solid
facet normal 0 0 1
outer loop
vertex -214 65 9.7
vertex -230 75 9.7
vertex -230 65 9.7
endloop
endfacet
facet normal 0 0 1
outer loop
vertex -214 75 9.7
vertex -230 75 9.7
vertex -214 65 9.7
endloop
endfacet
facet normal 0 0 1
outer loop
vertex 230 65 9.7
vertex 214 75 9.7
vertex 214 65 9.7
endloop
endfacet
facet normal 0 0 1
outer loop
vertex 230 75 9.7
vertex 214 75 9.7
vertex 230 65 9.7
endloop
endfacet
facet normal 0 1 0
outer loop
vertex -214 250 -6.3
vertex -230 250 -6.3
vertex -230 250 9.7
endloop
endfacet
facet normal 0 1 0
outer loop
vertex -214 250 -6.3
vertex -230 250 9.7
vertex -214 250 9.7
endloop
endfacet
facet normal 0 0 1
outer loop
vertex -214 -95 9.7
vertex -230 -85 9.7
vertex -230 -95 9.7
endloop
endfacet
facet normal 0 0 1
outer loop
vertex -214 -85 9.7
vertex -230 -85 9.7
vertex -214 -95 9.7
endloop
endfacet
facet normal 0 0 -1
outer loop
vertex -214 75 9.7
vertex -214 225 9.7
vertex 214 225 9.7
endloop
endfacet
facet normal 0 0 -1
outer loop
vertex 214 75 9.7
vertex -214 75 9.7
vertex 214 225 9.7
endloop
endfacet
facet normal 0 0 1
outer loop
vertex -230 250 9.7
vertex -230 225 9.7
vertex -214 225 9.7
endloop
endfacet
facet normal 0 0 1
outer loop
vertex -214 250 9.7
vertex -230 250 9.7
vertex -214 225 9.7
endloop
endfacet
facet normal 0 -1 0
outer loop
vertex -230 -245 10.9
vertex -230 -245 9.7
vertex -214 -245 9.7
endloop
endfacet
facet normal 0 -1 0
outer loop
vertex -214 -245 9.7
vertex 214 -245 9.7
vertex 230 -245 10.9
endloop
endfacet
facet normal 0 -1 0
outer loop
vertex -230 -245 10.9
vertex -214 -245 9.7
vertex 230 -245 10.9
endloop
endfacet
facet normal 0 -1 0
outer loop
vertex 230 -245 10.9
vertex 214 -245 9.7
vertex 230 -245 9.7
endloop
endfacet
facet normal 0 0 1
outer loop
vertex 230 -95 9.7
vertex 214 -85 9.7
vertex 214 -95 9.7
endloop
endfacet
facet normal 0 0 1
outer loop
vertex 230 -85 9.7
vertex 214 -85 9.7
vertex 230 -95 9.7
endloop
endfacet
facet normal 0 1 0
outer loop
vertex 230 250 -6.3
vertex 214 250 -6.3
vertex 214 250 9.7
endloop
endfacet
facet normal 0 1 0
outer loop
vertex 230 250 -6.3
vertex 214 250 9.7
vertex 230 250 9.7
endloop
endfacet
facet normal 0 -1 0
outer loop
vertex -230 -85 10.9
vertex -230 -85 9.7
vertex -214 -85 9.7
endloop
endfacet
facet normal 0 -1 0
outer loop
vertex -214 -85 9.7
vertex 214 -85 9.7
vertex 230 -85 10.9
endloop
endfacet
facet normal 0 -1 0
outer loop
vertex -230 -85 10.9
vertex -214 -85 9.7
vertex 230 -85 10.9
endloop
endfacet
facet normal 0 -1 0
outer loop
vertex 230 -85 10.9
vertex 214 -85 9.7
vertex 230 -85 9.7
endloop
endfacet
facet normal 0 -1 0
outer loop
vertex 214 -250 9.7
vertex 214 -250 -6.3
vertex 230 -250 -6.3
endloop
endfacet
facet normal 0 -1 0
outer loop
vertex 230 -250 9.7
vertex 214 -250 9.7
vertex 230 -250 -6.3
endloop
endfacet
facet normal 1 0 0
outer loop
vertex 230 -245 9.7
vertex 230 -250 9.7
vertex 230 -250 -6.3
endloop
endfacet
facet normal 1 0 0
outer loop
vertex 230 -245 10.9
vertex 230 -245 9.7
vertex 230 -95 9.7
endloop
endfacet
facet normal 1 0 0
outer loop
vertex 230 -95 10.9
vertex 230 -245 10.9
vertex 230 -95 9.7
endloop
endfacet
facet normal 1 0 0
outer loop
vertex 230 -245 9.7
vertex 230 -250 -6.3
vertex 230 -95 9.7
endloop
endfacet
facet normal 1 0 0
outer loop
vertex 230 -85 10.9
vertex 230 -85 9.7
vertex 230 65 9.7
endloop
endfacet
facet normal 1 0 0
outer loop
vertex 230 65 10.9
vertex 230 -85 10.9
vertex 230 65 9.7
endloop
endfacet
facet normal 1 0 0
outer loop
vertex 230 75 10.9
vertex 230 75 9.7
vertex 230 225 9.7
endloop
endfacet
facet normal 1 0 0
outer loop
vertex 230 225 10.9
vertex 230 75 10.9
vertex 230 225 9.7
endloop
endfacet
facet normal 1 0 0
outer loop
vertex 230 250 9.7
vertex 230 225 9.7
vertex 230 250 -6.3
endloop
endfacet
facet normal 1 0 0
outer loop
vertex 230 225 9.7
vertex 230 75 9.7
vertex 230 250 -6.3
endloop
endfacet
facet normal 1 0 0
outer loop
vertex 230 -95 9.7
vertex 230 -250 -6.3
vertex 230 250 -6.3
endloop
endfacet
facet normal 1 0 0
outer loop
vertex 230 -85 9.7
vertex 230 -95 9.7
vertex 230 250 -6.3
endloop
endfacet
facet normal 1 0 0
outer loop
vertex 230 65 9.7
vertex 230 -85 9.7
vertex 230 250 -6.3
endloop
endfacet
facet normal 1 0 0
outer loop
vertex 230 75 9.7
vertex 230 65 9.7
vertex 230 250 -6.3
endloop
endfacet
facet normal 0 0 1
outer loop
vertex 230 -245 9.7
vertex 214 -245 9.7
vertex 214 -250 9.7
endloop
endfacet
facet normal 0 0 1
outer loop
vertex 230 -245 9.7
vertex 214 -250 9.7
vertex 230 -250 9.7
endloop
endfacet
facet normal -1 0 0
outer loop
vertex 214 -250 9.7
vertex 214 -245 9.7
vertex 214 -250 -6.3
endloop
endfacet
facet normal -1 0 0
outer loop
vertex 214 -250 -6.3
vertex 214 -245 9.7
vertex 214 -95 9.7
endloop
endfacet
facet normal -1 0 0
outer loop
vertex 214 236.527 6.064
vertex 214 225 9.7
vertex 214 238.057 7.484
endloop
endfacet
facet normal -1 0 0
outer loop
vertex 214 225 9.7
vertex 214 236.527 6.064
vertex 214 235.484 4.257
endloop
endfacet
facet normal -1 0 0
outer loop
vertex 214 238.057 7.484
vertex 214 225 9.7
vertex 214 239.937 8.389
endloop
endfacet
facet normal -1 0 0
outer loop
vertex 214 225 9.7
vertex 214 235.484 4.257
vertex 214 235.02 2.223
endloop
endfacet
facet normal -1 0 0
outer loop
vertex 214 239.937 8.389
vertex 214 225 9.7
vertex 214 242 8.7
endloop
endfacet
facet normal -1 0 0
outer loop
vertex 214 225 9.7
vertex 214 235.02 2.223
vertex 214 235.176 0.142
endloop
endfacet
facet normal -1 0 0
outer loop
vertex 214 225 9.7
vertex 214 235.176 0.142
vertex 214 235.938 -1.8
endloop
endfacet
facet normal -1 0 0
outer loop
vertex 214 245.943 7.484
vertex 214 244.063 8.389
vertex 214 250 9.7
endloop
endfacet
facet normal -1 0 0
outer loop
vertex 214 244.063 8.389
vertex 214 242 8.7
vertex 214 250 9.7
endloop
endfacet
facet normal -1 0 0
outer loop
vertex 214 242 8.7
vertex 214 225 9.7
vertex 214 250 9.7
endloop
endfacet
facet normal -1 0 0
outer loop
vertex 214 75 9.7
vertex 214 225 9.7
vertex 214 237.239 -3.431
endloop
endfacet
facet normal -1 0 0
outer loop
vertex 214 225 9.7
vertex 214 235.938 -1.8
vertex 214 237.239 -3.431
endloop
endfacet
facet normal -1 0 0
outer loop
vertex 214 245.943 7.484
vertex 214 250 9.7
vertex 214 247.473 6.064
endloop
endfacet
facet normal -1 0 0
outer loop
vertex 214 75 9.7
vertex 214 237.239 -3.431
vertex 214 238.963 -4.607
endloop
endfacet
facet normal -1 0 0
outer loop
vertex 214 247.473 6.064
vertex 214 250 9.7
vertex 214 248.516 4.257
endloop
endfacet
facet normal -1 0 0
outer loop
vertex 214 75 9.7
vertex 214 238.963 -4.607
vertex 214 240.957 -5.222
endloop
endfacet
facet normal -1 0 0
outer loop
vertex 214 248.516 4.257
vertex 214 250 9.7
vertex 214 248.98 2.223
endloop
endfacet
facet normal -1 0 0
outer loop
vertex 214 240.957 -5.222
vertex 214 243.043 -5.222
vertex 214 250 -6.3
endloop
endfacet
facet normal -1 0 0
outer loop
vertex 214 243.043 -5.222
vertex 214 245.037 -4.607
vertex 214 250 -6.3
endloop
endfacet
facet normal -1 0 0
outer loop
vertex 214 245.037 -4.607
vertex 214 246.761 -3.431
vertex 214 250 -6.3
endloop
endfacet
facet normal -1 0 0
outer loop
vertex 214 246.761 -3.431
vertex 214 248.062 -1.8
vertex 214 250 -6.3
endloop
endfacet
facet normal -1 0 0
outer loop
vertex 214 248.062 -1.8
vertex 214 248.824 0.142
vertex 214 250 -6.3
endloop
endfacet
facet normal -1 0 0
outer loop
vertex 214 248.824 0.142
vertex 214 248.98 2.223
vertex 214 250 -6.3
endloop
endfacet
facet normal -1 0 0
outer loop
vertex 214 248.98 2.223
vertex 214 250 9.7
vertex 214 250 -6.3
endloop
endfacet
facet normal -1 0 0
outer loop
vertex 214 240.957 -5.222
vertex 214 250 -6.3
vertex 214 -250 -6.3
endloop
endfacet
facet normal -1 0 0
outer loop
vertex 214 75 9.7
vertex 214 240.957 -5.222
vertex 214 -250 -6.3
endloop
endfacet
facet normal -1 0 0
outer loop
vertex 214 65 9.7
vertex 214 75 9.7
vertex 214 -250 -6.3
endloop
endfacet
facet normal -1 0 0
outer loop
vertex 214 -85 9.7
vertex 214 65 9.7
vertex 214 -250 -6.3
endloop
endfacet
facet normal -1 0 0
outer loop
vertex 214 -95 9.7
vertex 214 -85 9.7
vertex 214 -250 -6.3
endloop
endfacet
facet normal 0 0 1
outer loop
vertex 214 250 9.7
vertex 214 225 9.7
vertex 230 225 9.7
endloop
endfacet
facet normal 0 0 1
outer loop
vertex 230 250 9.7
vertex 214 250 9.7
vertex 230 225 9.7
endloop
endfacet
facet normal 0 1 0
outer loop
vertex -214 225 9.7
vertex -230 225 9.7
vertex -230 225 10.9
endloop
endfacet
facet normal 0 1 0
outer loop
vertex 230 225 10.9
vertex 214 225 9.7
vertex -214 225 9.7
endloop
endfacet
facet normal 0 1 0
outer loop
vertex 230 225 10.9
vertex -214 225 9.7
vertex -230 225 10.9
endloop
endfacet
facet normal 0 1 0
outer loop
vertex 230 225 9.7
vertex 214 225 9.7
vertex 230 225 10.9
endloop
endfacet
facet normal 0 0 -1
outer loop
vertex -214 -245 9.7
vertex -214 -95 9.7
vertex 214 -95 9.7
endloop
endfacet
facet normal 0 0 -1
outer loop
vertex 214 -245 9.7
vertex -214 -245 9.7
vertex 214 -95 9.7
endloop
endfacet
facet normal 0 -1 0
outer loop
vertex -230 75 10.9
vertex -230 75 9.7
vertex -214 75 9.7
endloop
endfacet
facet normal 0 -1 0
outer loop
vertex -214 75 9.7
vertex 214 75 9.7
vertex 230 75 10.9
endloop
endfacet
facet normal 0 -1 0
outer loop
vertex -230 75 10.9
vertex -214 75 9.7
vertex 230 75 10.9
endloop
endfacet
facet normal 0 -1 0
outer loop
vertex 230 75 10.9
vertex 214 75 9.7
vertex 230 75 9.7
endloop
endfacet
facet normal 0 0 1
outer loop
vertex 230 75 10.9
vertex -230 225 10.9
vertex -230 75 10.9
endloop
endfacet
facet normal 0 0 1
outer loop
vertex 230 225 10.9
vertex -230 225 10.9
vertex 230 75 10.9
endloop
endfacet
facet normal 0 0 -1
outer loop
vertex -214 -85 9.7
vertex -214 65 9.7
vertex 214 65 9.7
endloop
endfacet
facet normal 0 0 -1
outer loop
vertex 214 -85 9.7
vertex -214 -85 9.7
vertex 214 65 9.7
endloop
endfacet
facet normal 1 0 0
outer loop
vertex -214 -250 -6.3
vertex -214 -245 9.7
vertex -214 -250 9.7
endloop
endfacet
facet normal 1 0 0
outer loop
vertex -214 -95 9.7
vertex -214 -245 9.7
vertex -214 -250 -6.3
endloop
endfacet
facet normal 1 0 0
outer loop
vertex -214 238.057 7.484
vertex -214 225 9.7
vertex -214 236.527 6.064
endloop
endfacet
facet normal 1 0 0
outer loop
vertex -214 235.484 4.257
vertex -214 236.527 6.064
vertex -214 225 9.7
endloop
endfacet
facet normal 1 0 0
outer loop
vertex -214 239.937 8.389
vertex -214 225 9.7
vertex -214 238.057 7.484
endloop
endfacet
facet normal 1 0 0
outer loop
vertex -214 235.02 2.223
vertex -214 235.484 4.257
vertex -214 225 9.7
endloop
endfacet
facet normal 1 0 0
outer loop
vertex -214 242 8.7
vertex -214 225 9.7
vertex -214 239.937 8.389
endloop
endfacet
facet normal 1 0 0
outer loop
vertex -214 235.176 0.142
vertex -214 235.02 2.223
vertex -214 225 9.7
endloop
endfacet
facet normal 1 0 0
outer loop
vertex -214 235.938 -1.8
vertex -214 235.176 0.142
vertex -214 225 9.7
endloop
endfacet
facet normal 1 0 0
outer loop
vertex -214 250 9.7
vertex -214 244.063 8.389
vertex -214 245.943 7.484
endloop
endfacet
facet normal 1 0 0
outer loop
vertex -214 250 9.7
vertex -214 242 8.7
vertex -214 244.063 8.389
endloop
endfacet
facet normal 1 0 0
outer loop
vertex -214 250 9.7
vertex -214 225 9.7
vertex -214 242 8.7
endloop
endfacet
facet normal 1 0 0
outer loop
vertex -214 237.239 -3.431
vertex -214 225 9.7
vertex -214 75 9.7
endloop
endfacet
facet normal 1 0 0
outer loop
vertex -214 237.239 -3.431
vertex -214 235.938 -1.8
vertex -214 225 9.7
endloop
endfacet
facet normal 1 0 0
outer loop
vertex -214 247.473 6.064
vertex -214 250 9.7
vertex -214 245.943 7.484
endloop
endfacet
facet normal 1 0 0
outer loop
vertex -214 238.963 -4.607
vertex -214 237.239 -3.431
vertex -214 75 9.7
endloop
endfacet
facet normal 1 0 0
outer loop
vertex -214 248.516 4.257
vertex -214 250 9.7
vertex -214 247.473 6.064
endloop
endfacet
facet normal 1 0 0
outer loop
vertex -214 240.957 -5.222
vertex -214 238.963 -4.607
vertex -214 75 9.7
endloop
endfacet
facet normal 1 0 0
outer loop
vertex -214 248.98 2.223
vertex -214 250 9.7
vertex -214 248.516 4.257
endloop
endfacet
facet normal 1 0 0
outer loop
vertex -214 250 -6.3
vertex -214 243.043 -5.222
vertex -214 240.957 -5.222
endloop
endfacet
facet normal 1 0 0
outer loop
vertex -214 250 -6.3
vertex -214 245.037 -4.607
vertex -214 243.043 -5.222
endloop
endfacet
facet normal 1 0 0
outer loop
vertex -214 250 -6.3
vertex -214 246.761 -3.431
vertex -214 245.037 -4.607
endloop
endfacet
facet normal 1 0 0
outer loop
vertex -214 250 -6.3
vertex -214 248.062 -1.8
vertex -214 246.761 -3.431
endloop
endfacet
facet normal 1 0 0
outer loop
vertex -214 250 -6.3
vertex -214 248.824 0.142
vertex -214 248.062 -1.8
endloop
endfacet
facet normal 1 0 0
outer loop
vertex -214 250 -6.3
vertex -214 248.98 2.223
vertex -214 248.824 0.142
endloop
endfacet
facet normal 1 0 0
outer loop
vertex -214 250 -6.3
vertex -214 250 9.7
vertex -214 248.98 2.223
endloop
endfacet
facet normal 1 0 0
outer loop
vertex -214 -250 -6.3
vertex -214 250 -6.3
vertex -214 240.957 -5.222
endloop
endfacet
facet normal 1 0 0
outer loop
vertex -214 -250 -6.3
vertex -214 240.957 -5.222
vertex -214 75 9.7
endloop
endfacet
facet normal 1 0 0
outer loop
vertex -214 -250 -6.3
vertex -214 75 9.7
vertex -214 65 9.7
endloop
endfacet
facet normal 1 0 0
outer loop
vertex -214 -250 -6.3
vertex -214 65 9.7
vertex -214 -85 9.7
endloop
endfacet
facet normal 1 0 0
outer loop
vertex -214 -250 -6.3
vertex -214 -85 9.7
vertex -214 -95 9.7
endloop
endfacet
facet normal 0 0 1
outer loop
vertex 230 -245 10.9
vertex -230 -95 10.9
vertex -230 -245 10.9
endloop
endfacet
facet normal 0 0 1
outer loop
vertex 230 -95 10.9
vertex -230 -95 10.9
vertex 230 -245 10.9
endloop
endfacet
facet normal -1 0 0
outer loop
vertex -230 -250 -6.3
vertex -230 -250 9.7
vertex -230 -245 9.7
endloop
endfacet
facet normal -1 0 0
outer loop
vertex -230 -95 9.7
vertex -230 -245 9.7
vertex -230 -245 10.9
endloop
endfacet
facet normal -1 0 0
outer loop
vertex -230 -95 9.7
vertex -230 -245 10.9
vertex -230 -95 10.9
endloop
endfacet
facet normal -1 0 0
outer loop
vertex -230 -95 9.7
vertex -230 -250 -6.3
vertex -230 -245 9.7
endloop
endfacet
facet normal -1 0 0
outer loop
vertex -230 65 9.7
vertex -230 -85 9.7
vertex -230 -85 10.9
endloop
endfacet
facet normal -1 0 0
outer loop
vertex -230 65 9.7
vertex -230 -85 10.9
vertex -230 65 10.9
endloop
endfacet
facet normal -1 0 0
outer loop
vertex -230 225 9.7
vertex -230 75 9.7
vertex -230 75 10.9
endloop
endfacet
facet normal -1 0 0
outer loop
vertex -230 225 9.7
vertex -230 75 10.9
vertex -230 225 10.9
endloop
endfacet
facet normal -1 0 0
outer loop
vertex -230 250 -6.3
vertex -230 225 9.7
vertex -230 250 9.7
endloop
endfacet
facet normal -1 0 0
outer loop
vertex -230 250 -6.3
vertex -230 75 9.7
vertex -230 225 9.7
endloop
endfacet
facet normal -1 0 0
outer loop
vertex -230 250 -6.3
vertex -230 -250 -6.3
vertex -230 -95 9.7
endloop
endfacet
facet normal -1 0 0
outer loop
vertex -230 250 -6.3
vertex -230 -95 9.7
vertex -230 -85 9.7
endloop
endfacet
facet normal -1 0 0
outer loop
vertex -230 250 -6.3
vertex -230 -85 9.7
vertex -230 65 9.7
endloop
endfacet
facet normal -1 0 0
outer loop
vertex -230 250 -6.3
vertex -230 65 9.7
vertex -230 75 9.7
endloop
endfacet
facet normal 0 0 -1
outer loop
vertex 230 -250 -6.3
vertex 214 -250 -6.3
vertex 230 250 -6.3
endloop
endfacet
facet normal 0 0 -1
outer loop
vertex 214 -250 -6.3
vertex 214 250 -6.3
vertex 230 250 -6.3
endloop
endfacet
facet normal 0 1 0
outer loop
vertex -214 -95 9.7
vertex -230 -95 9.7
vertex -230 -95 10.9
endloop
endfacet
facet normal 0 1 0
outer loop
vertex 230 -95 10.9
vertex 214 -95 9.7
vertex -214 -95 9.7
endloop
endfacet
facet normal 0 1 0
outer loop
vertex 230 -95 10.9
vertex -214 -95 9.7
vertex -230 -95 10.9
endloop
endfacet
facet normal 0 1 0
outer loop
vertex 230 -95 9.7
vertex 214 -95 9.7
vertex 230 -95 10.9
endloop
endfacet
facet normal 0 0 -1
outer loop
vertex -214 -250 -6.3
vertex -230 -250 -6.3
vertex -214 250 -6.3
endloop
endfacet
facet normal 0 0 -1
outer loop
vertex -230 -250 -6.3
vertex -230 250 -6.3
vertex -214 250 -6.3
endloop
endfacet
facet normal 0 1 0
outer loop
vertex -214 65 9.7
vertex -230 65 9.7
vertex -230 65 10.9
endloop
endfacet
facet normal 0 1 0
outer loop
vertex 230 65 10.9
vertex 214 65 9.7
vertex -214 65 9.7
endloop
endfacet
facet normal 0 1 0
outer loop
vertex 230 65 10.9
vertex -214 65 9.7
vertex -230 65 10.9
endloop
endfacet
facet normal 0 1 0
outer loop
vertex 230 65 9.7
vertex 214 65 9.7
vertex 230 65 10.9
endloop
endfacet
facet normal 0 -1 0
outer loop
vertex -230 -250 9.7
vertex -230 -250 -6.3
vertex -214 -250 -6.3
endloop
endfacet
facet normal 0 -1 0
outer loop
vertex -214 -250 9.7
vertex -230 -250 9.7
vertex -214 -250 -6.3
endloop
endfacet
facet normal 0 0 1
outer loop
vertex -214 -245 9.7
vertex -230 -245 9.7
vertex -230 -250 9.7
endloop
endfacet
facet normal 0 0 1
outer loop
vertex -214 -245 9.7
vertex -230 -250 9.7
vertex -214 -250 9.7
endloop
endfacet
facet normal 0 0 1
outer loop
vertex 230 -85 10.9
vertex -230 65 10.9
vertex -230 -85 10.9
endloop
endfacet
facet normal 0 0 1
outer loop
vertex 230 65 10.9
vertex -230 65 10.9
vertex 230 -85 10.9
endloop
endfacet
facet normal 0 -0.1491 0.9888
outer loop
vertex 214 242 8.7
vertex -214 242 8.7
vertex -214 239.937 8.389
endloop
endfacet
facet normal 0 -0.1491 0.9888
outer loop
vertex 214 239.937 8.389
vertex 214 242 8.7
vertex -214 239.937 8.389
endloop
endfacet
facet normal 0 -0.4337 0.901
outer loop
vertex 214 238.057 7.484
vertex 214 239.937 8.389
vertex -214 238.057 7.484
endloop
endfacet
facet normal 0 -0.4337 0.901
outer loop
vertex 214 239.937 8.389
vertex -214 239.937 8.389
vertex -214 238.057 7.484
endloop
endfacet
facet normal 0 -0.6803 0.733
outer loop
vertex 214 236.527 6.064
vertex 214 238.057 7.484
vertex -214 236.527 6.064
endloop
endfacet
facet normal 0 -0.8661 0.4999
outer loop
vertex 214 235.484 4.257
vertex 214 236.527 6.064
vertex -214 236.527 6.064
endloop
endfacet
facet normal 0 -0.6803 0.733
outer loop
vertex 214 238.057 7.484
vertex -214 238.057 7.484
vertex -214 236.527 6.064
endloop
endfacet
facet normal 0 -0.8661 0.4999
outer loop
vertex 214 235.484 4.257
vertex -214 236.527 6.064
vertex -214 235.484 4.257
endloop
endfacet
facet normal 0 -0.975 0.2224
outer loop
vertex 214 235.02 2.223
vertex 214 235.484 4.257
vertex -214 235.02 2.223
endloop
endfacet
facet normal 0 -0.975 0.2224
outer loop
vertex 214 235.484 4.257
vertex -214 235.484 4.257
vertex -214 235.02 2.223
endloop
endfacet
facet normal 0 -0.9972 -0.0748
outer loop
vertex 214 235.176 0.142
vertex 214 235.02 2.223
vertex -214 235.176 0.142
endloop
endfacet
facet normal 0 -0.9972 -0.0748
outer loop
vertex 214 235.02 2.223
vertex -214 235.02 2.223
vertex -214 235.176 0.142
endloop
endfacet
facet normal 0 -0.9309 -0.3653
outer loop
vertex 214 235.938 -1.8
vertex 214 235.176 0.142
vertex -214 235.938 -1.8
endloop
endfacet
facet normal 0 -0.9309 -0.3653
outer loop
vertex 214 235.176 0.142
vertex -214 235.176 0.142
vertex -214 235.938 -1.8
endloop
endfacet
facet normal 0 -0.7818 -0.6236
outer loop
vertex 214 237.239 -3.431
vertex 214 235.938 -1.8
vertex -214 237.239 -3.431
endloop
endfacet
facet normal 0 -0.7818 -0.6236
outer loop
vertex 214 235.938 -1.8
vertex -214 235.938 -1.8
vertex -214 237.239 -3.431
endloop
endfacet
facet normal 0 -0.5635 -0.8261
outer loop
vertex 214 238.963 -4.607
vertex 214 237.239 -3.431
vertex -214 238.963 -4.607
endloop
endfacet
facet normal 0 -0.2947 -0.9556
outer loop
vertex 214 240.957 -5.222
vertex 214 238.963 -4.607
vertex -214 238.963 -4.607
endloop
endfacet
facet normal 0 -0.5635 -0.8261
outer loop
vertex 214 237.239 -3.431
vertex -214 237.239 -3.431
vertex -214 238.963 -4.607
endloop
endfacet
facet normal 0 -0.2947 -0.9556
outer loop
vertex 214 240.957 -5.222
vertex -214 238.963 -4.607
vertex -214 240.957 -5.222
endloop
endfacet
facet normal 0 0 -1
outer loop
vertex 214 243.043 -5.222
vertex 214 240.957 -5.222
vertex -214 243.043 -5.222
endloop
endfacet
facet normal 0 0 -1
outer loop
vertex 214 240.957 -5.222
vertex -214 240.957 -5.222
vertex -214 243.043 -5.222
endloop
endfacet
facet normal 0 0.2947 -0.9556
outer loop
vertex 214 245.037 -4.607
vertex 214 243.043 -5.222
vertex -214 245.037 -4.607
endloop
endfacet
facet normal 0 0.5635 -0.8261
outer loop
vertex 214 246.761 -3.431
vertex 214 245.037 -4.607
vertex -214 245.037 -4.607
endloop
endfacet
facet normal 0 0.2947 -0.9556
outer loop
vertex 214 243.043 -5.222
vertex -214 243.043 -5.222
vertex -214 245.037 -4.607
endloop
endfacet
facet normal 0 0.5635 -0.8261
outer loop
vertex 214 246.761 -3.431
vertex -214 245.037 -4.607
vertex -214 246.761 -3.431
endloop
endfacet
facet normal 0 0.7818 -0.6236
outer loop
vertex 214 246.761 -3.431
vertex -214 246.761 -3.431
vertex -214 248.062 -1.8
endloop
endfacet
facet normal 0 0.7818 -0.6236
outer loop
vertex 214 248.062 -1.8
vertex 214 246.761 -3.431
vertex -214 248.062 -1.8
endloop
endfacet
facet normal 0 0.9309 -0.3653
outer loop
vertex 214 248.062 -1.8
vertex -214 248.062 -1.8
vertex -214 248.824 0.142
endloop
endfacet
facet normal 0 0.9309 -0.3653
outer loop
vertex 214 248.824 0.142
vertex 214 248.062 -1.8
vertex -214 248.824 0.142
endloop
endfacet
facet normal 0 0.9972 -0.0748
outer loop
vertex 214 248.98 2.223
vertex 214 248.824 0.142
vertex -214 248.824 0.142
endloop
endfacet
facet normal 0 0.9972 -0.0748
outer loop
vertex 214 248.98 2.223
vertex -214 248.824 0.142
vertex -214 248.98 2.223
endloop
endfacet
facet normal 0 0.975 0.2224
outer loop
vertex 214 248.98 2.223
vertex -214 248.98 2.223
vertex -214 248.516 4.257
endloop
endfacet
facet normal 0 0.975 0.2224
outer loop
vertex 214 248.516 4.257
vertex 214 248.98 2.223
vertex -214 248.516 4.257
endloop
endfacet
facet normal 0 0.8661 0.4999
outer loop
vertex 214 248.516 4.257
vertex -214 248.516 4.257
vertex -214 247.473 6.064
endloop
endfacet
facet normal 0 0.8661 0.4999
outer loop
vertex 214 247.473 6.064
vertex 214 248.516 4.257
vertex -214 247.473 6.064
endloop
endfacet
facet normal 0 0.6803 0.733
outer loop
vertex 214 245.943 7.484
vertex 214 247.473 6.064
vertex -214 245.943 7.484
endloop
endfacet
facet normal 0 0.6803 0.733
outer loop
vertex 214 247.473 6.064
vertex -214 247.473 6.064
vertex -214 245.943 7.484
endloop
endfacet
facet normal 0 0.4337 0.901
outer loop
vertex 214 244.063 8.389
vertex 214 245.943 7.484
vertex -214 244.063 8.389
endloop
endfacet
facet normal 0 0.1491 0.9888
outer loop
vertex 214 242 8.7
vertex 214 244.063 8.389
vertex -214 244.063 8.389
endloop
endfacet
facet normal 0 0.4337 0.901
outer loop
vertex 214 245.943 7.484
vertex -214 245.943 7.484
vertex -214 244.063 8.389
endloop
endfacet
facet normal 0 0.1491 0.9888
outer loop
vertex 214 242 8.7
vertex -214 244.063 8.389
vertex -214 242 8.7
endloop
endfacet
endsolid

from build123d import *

# Parameters (mm, degrees)
SKETCH1_W             = 16
SKETCH1_H             = 16
BOSS_EXTRUDE1_DEPTH   = 250
BOSS_EXTRUDE1_2_DEPTH = 250
SKETCH2_W             = 460
SKETCH2_H             = 150
BOSS_EXTRUDE2_DEPTH   = 1.2
SKETCH3_R             = 7
BOSS_EXTRUDE3_DEPTH   = 428


with BuildPart() as part:
    # Sketch1 → Boss-Extrude1 (new, symmetric)
    with BuildSketch(Plane(origin=(0, 0, 0), x_dir=(1, 0, 0), z_dir=(0, 1, 0))):
        with Locations((-222, -1.7)):
            Rectangle(SKETCH1_W, SKETCH1_H)
    extrude(amount=BOSS_EXTRUDE1_DEPTH, both=True)



with BuildPart() as body_2:
    # Sketch1 → Boss-Extrude1 2 (new, symmetric)
    with BuildSketch(Plane(origin=(0, 0, 0), x_dir=(1, 0, 0), z_dir=(0, 1, 0))):
        with Locations((222, -1.7)):
            Rectangle(SKETCH1_W, SKETCH1_H)
    extrude(amount=BOSS_EXTRUDE1_2_DEPTH, both=True)


with BuildPart() as part_1:
    add(part.part)

    add(body_2.part)  # Boss-Extrude2 merges body 2
    # Sketch2 → Boss-Extrude2 (add)
    with BuildSketch(Plane.XY.offset(9.7)):
        with Locations((0, 150)):
            Rectangle(SKETCH2_W, SKETCH2_H)
        with Locations((0, -10)):
            Rectangle(SKETCH2_W, SKETCH2_H)
        with Locations((0, -170)):
            Rectangle(SKETCH2_W, SKETCH2_H)
    extrude(amount=BOSS_EXTRUDE2_DEPTH)

    # Sketch3 → Boss-Extrude3 (add)
    with BuildSketch(Plane(origin=(-214, 0, 0), x_dir=(0, 0, -1), z_dir=(1, 0, 0))):
        with Locations(Location((-1.7, 242, 0), (0, 0, 180))):
            Circle(SKETCH3_R)
    extrude(amount=BOSS_EXTRUDE3_DEPTH)


solid = part_1.part
